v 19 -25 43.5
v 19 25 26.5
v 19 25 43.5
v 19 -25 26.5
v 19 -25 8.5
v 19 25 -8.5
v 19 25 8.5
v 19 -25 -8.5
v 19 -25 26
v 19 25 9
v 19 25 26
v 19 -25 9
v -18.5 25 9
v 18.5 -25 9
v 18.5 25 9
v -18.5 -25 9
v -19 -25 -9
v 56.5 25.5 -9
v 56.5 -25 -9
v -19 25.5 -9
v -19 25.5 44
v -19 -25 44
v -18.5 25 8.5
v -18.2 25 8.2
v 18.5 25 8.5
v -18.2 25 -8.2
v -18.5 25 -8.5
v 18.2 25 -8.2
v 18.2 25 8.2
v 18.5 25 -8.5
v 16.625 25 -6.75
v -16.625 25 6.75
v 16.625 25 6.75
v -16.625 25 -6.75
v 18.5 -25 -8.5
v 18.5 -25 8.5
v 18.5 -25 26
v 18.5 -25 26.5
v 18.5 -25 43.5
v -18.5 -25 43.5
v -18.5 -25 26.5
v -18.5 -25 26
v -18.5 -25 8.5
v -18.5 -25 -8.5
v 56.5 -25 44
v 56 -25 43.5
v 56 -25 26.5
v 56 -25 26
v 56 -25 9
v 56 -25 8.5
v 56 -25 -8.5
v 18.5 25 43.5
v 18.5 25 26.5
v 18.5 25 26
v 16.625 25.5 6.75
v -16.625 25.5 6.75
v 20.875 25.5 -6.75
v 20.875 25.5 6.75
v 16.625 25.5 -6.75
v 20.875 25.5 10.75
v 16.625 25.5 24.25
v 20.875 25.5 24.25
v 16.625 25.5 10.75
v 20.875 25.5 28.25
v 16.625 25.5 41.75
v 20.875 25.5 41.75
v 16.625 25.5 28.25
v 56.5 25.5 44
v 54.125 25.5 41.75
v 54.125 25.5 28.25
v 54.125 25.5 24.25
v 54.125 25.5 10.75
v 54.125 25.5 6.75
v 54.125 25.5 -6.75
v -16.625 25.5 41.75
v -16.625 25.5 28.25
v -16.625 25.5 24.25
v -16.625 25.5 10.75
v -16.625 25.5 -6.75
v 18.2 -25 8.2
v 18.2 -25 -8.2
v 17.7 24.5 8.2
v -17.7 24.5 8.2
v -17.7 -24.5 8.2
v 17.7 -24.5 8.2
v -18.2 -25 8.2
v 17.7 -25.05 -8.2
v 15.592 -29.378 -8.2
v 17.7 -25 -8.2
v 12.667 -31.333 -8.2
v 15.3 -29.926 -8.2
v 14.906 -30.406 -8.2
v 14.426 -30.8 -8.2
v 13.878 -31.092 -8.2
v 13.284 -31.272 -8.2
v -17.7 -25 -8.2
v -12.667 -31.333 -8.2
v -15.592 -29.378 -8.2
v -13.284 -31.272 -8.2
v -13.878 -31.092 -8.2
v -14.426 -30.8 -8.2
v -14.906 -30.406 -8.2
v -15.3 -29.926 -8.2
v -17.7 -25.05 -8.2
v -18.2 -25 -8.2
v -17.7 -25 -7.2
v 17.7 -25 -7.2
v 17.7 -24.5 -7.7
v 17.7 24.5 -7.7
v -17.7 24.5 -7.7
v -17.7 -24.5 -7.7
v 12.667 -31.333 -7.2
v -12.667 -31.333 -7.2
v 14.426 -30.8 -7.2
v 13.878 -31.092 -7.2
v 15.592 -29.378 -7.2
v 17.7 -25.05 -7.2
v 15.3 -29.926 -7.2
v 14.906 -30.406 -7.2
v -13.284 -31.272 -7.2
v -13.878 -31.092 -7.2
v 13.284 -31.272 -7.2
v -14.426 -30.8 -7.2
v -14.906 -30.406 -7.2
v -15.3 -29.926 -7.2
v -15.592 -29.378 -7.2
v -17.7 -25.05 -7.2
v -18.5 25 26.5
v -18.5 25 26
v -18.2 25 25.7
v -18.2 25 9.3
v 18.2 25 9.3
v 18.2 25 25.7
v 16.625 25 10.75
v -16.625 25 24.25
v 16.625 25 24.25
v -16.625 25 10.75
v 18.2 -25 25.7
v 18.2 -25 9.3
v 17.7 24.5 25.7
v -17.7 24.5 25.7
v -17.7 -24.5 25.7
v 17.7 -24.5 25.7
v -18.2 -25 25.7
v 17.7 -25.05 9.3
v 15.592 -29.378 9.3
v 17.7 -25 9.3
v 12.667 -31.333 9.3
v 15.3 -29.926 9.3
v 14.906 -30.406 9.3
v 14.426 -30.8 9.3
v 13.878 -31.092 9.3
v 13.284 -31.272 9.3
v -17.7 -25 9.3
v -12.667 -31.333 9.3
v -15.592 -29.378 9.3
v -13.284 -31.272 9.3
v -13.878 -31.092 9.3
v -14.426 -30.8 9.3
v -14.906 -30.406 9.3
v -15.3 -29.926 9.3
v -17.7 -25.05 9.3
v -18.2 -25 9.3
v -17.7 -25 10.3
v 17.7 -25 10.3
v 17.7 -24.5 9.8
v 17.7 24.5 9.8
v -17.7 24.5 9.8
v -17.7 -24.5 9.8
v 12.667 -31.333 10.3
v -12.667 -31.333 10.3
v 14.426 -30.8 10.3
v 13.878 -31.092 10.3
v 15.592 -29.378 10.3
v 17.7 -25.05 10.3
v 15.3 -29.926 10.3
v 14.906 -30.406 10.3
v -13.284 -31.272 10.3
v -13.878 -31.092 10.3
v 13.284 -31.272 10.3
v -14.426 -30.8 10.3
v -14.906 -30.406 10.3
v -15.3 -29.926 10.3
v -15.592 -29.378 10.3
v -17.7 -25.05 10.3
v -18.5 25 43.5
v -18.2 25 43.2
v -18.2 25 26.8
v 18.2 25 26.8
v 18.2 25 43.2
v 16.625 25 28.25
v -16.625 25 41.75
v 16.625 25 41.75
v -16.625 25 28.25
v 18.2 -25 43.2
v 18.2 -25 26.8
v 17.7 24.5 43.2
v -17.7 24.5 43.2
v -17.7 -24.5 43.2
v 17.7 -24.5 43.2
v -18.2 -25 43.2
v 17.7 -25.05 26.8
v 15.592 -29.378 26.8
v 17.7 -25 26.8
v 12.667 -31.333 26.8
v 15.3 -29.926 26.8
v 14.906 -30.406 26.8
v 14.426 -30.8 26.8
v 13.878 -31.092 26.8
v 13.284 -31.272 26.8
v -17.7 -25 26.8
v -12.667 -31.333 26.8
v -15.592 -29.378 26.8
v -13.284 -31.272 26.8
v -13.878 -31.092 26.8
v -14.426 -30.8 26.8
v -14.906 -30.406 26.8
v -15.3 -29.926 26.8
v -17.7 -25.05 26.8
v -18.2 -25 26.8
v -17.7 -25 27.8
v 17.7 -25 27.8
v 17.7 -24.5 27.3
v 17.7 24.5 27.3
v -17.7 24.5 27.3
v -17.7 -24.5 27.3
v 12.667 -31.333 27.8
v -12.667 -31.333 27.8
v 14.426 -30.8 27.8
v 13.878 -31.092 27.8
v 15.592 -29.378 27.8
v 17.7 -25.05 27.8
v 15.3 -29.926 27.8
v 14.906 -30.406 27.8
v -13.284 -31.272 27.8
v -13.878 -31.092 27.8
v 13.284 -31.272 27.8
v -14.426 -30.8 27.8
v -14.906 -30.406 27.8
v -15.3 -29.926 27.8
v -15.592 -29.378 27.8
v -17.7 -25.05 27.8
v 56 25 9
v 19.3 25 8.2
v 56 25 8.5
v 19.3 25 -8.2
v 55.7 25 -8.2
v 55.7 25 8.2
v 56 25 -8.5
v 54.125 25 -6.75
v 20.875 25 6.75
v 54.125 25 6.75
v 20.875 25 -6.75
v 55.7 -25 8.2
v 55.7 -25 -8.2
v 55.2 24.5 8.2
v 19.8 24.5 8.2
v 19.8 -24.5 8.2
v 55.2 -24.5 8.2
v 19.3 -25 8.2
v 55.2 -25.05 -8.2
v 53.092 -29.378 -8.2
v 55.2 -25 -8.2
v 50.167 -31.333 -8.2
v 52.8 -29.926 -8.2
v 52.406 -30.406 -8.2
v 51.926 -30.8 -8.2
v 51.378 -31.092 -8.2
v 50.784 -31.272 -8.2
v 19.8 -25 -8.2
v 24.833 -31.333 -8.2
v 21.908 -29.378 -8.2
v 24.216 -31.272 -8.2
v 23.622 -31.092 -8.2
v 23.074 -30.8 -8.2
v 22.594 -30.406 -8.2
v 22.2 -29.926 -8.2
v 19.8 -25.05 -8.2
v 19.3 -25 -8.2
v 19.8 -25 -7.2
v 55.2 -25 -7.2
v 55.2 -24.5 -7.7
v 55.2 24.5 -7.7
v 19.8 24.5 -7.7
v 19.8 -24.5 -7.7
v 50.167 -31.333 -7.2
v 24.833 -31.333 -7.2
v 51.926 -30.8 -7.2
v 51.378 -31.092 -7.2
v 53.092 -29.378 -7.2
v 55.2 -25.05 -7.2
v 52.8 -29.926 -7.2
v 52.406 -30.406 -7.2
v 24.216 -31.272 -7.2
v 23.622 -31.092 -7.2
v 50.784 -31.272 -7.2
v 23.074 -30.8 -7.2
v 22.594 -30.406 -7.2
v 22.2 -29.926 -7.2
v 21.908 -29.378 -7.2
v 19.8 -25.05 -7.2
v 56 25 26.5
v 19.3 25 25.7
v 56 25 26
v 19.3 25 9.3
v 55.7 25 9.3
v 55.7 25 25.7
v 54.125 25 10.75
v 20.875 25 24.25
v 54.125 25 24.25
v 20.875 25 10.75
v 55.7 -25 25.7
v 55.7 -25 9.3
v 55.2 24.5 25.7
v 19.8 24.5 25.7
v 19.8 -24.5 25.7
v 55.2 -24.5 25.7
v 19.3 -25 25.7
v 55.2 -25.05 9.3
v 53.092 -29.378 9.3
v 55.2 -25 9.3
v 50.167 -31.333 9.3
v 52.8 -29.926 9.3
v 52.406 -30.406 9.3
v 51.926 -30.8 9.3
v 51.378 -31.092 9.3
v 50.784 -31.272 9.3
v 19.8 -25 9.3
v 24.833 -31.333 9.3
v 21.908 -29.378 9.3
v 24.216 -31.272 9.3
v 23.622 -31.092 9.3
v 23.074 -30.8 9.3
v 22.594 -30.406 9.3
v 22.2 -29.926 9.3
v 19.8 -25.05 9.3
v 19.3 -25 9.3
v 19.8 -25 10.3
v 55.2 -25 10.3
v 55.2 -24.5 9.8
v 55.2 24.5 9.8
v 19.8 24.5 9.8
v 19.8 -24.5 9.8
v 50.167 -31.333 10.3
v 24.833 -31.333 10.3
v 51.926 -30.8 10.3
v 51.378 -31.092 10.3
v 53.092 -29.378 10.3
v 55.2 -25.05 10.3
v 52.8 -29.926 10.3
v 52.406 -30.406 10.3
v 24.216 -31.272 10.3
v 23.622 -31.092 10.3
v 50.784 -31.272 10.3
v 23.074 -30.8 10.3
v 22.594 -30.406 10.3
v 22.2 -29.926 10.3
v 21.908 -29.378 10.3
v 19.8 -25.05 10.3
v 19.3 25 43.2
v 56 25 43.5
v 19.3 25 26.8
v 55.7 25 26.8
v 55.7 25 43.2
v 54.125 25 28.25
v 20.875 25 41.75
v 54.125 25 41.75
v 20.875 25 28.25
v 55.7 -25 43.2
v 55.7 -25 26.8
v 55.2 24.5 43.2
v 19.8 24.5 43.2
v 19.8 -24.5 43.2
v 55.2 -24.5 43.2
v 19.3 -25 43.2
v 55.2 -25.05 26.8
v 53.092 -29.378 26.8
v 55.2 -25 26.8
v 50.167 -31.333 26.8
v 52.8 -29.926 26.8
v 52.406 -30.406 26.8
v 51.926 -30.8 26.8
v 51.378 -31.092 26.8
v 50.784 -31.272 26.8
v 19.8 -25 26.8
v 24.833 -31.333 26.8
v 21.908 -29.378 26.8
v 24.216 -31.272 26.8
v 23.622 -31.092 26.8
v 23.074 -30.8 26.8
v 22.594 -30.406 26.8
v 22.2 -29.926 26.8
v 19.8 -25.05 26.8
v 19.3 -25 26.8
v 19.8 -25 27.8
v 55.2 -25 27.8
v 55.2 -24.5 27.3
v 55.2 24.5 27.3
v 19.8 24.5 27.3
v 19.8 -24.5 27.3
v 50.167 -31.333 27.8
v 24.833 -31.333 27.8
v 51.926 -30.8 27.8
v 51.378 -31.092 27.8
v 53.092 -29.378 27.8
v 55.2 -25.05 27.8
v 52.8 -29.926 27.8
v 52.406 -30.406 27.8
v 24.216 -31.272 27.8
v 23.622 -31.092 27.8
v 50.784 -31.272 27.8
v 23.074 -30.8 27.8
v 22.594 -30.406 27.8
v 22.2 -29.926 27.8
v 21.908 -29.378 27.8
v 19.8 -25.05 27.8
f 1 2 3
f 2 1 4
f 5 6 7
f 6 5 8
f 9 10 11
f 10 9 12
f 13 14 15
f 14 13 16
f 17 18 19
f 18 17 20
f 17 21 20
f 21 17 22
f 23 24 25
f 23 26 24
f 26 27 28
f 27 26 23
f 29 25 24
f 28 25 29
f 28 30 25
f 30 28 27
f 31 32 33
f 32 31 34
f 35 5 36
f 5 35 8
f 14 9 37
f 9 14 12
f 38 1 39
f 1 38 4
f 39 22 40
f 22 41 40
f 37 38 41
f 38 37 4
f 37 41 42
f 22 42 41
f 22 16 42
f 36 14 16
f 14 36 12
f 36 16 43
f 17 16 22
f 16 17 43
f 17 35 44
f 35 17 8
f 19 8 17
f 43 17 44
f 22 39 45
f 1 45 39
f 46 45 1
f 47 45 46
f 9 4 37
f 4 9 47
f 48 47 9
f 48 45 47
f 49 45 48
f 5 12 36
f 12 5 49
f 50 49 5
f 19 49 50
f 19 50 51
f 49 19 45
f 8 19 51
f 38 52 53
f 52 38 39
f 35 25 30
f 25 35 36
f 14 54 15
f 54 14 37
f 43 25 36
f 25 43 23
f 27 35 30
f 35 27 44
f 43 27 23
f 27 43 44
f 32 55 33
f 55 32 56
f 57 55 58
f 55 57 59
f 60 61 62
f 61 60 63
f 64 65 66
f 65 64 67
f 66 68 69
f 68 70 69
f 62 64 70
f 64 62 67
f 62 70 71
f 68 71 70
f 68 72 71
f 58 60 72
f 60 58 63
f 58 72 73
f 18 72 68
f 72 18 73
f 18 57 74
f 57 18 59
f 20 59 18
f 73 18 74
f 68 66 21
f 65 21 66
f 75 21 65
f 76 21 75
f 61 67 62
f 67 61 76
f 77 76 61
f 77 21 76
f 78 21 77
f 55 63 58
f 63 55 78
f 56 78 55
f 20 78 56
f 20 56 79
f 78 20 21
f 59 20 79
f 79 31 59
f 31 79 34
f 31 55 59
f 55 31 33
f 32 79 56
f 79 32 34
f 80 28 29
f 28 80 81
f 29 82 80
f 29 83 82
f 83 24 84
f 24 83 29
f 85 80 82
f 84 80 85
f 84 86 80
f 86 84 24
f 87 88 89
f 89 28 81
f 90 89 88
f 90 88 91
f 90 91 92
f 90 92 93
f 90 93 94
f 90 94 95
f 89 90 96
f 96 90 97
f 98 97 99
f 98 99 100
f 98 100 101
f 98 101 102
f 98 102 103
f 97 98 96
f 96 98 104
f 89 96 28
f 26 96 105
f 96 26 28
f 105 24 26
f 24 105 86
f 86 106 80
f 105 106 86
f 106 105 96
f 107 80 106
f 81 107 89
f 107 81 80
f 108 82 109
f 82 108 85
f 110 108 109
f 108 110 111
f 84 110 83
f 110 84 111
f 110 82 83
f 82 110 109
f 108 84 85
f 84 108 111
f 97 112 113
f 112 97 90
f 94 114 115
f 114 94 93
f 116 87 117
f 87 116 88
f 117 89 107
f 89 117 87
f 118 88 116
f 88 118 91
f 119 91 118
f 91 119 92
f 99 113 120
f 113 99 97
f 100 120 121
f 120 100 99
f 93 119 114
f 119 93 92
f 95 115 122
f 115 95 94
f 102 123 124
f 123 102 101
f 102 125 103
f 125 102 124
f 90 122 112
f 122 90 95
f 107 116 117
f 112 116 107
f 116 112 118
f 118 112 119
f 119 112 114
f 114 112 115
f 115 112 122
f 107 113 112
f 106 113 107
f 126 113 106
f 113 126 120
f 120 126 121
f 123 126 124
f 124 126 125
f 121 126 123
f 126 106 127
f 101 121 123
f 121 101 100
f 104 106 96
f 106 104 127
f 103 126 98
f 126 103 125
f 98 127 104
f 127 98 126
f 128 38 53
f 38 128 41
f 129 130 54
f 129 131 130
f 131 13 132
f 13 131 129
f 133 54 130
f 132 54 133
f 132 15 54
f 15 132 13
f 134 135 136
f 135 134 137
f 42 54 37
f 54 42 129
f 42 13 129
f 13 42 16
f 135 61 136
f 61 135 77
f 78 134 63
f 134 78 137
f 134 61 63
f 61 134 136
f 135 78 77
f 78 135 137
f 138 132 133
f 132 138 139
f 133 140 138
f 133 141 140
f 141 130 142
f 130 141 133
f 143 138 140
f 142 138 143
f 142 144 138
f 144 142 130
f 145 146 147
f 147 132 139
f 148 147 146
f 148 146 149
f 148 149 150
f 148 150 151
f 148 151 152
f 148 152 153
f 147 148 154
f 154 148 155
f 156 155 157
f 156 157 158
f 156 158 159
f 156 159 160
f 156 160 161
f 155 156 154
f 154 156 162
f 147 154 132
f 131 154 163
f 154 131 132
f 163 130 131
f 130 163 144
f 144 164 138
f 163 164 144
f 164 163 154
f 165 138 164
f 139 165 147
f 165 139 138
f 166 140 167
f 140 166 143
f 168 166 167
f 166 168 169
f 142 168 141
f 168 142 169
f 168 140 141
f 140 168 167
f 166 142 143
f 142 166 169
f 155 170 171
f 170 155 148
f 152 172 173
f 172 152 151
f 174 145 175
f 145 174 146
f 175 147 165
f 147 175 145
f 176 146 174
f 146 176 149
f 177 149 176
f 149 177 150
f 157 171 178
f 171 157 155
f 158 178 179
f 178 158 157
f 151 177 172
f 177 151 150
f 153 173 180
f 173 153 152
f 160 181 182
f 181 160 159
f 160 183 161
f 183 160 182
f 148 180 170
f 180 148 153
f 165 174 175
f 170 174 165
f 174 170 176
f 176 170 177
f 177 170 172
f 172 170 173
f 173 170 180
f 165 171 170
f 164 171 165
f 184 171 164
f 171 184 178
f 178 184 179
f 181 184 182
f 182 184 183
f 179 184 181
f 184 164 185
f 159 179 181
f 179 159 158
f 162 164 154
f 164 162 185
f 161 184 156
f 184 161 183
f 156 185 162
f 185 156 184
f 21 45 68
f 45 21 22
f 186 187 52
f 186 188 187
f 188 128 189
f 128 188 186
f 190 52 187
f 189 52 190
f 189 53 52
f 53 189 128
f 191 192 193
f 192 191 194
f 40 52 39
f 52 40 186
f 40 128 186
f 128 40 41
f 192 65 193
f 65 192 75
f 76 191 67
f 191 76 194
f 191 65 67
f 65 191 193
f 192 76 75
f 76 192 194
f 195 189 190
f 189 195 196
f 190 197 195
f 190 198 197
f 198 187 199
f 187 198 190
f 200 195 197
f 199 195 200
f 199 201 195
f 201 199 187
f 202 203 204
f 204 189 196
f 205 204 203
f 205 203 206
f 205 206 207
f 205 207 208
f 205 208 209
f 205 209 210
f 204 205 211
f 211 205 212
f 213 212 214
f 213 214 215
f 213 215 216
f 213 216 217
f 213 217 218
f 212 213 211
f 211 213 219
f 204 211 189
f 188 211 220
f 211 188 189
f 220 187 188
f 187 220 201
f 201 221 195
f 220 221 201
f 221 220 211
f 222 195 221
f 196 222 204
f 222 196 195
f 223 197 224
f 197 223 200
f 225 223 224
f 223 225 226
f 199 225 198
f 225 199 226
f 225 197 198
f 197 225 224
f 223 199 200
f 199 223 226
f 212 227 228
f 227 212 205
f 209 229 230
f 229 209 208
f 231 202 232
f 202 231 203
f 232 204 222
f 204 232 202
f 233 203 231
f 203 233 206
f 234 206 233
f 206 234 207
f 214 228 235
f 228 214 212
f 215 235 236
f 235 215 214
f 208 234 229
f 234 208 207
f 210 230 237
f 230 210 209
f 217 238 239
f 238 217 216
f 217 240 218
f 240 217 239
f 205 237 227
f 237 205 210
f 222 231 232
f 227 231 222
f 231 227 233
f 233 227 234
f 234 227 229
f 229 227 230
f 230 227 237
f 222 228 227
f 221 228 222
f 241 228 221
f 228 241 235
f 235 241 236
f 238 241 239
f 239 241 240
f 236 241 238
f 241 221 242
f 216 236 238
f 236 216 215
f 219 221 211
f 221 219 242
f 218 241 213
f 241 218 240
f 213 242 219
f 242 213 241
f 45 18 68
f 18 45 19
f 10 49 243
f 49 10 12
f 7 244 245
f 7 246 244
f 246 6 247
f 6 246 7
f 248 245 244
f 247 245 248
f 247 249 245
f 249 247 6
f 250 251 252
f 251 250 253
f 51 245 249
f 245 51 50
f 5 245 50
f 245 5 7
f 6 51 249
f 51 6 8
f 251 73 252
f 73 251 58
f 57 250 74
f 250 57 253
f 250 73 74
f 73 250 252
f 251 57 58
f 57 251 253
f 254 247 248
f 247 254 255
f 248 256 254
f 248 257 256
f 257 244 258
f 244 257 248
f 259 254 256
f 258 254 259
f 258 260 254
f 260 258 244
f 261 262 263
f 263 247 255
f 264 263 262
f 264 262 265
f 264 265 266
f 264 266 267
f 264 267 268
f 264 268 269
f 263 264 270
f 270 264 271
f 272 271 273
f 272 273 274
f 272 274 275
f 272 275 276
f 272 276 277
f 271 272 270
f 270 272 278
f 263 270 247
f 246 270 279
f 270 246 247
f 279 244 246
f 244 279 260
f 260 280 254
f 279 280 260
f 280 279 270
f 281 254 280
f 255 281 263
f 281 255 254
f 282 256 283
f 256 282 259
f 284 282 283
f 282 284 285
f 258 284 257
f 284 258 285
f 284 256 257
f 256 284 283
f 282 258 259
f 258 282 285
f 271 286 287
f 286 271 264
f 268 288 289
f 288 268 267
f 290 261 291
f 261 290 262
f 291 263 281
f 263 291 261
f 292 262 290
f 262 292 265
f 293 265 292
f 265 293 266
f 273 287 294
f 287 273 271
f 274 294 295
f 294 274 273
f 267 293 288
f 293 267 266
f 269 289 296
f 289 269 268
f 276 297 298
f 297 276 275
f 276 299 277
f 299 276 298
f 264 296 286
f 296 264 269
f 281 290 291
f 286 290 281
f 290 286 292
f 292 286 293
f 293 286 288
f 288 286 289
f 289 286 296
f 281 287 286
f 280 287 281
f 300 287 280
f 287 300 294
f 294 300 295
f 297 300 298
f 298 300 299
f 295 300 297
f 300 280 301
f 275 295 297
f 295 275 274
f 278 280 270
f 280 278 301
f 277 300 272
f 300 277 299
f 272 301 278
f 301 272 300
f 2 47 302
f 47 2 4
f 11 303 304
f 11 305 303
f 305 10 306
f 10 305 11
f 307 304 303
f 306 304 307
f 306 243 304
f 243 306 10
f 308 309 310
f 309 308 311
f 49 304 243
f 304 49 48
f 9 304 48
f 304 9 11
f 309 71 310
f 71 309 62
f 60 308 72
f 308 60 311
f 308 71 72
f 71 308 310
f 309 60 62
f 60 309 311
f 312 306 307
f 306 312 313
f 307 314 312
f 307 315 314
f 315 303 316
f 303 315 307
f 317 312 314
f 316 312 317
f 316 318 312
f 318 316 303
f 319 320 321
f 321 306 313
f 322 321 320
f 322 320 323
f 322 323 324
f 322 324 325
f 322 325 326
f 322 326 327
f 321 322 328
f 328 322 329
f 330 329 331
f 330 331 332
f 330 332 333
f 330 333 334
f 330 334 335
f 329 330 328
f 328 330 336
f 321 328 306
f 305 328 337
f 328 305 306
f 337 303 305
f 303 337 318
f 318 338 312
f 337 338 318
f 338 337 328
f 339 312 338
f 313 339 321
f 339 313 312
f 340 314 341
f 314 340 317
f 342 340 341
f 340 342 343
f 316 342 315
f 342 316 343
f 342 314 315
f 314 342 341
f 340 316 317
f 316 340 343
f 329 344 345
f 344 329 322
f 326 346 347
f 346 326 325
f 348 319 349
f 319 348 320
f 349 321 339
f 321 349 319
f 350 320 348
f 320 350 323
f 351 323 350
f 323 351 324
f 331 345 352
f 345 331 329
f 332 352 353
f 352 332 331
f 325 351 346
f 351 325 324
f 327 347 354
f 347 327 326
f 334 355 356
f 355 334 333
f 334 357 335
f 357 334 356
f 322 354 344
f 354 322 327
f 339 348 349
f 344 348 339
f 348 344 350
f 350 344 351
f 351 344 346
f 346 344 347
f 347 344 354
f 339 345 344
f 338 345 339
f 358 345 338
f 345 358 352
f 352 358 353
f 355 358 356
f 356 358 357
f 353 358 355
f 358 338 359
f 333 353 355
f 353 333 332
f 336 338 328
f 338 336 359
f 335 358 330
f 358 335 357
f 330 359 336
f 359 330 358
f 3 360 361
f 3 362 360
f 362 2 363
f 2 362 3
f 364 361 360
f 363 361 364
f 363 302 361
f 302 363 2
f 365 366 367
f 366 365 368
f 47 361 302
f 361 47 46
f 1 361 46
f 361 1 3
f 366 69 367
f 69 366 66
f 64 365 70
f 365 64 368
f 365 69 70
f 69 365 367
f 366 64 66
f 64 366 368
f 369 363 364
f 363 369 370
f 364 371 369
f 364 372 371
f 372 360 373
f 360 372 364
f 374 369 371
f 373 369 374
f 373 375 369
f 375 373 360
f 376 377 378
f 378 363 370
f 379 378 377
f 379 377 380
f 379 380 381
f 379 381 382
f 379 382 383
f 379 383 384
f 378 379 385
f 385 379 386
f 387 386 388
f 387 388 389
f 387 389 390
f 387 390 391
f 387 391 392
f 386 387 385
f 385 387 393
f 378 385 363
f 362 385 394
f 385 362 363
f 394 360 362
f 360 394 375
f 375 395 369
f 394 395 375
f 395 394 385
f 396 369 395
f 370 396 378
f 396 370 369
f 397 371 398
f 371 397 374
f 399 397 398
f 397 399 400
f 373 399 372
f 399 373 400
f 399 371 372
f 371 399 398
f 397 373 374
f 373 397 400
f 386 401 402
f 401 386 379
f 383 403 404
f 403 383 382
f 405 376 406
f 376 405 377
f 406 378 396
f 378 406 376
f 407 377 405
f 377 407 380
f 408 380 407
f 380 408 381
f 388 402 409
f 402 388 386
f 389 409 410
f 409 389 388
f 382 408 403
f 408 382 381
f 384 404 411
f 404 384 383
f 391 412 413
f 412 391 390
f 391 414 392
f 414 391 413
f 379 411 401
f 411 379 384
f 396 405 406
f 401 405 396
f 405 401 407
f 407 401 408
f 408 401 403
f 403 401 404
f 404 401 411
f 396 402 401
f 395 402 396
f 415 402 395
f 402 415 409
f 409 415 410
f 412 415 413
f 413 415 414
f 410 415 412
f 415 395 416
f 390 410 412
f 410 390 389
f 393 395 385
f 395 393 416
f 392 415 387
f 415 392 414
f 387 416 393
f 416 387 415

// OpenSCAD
d = 50;
w = 38;
h = 18;
wth = 0.5;
dop = 0.6; //printer precision
xs=1;
ys=2;
hdiv=8;
wdiv=16;

module outerbox() {
    difference() {
        cube([w,d,h], center=true);
        cube([w-wth*2,d+wth,h-wth*2], center=true);
    }
    translate([0,d/2+wth/2,(h-h/hdiv)/2])
        cube([w,wth,h/hdiv], center=true);
    translate([0,d/2+wth/2,-(h-h/hdiv)/2])
        cube([w,wth,h/hdiv], center=true);

    translate([(w-w/wdiv)/2,d/2+wth/2,0])
        cube([w/wdiv,wth,h], center=true);
    translate([-(w-w/wdiv)/2,d/2+wth/2,0])
        cube([w/wdiv,wth,h], center=true);
}

module innerbox() {
    union() {
        difference() {
            cube([w-wth*2-dop,d,h-wth*2-dop], center=true);
            translate([0,0,wth])
                cube([w-wth*4-dop,d-wth*2,h-wth*2-dop], center=true);
        }
        
        translate([0,-d/2,-(h-wth*2-dop)/2+wth])
        hull() {
            cube([w-wth*4-dop,0.1,wth*2], center=true);
            translate([-w/3,-w/12,0])
                cylinder(h=wth*2, d=w/6 ,$fn=32, center=true);
            translate([w/3,-w/12,0])
                cylinder(h=wth*2, d=w/6 ,$fn=32, center=true);
        }
    }
}

for (xi = [0:xs]) {
    for (yi = [0:ys]) {
        translate([(w-wth)*xi,0,(h-wth)*yi]) {
            outerbox();
            innerbox();
        }
    }
}

//innerbox();
